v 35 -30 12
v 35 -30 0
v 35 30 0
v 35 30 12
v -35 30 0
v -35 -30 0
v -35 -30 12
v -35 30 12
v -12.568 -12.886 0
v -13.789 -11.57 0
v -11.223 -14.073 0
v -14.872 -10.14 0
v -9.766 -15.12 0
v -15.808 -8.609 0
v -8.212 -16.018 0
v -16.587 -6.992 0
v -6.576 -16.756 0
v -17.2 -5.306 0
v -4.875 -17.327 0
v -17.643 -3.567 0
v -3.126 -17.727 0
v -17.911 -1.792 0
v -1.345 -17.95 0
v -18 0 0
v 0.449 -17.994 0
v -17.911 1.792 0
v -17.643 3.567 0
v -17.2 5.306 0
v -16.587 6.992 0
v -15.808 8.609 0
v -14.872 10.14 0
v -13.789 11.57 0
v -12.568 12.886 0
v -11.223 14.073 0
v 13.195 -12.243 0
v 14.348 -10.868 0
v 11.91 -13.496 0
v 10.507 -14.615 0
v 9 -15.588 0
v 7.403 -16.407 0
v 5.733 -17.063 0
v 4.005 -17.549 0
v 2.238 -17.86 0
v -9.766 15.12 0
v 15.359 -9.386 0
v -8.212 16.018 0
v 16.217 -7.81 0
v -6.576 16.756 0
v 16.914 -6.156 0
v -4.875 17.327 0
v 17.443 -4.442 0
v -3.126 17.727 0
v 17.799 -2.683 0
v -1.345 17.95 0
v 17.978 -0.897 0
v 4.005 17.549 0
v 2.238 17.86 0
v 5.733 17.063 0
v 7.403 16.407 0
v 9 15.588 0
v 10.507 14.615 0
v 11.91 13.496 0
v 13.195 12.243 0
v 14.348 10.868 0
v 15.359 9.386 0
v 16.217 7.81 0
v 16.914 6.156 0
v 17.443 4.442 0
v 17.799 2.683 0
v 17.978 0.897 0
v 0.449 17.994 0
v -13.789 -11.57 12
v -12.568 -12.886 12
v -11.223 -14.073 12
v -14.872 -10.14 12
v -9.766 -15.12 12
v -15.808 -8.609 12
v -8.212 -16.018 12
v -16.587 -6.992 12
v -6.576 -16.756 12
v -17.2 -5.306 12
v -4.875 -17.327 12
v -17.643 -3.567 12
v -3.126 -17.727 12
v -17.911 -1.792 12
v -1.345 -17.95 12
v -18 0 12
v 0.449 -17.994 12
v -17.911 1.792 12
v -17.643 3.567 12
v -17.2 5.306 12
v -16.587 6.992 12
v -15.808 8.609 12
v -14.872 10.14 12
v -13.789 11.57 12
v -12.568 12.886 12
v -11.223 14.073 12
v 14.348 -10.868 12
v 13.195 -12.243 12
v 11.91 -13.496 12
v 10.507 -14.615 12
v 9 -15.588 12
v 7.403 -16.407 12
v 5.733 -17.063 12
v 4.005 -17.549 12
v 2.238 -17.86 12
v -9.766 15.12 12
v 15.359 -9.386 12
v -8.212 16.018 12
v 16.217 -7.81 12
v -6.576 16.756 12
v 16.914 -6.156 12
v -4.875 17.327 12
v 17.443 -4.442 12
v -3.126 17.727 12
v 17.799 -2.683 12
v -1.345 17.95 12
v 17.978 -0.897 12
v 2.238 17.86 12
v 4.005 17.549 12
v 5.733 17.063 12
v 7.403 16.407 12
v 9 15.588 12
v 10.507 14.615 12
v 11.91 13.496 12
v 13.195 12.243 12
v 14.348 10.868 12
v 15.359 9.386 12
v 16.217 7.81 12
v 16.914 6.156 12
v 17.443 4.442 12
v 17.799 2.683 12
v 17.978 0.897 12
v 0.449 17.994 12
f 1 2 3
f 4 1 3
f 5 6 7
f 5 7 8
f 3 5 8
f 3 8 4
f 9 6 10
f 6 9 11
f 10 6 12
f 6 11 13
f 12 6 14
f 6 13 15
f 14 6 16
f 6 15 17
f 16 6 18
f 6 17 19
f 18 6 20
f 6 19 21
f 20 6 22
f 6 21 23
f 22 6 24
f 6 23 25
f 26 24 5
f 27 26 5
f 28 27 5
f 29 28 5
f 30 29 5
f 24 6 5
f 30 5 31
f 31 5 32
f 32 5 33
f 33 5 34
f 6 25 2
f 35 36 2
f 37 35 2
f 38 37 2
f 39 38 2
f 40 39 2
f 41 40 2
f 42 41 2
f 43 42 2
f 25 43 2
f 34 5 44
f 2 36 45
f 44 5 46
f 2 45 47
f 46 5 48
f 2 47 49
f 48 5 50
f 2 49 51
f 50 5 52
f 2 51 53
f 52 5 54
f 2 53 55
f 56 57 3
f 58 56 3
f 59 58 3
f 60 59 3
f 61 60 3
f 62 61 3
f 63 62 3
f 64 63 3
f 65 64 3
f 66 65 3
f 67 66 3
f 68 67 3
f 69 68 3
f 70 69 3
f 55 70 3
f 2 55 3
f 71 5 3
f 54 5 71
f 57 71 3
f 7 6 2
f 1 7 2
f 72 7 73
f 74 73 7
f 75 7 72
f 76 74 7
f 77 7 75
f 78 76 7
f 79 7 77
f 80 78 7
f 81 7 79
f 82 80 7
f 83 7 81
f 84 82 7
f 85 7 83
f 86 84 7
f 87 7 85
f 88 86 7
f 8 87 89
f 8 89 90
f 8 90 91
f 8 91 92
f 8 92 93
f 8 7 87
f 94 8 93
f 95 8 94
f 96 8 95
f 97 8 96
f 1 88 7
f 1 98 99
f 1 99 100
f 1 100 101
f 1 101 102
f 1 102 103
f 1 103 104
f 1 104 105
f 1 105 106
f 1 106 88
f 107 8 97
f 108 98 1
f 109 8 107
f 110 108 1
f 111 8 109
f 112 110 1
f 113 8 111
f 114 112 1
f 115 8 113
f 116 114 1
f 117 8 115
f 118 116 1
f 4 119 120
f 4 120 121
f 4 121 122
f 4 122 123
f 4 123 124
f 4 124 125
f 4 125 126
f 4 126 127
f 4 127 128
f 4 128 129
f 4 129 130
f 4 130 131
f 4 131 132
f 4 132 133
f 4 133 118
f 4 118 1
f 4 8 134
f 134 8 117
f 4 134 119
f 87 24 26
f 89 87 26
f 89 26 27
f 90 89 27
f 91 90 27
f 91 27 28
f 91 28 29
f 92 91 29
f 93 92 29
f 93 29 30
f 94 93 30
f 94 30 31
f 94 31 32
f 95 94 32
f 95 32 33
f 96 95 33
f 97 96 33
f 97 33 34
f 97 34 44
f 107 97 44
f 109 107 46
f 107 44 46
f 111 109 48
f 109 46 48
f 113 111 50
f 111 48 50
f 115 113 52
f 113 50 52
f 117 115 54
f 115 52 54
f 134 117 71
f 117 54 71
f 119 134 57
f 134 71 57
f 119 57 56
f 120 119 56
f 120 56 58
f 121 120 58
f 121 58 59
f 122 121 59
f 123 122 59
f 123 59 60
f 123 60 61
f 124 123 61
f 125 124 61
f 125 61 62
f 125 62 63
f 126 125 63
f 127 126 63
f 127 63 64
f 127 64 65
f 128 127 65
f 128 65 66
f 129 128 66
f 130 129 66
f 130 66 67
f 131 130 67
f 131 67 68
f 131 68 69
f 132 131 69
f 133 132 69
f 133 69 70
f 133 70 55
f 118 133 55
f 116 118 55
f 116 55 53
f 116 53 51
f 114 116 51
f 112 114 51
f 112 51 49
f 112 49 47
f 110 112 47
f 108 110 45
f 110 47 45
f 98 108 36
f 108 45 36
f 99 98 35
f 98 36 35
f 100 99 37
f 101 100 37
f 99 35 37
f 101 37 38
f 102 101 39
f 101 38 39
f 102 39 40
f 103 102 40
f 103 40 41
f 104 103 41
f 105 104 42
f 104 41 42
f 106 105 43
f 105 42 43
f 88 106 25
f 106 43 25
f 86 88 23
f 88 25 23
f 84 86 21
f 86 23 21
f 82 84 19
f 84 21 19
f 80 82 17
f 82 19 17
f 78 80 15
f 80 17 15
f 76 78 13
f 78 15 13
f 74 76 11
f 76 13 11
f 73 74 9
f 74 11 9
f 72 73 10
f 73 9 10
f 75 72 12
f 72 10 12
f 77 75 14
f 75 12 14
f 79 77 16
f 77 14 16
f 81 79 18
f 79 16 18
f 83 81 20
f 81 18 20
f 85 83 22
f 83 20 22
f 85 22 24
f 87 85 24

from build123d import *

# Parameters (mm, degrees)
SKETCH_1_W          = 70
SKETCH_1_H          = 60
EXTRUDE_1_DEPTH     = 12
CUT_EXTRUDE_1_REACH = 49.634
SKETCH_2_R          = 18


with BuildPart() as part:
    # 草图1 → 凸台-拉伸1 (new body)
    with BuildSketch(Plane.XY):
        Rectangle(SKETCH_1_W, SKETCH_1_H)
    extrude(amount=EXTRUDE_1_DEPTH)

    # 草图2 → 切除-拉伸1 (cut, up to next)
    with BuildSketch(Plane(origin=(0, 0, 0), x_dir=(-1, 0, 0), z_dir=(0, 0, -1)), mode=Mode.PRIVATE) as cut_extrude_1_sk1:
        Circle(SKETCH_2_R)
    cut_extrude_1_tool1 = extrude(cut_extrude_1_sk1.sketch, amount=-CUT_EXTRUDE_1_REACH, mode=Mode.PRIVATE) & part.part
    add(cut_extrude_1_tool1.solids().sort_by_distance((0, 0, 0))[0], mode=Mode.SUBTRACT)


solid = part.part
